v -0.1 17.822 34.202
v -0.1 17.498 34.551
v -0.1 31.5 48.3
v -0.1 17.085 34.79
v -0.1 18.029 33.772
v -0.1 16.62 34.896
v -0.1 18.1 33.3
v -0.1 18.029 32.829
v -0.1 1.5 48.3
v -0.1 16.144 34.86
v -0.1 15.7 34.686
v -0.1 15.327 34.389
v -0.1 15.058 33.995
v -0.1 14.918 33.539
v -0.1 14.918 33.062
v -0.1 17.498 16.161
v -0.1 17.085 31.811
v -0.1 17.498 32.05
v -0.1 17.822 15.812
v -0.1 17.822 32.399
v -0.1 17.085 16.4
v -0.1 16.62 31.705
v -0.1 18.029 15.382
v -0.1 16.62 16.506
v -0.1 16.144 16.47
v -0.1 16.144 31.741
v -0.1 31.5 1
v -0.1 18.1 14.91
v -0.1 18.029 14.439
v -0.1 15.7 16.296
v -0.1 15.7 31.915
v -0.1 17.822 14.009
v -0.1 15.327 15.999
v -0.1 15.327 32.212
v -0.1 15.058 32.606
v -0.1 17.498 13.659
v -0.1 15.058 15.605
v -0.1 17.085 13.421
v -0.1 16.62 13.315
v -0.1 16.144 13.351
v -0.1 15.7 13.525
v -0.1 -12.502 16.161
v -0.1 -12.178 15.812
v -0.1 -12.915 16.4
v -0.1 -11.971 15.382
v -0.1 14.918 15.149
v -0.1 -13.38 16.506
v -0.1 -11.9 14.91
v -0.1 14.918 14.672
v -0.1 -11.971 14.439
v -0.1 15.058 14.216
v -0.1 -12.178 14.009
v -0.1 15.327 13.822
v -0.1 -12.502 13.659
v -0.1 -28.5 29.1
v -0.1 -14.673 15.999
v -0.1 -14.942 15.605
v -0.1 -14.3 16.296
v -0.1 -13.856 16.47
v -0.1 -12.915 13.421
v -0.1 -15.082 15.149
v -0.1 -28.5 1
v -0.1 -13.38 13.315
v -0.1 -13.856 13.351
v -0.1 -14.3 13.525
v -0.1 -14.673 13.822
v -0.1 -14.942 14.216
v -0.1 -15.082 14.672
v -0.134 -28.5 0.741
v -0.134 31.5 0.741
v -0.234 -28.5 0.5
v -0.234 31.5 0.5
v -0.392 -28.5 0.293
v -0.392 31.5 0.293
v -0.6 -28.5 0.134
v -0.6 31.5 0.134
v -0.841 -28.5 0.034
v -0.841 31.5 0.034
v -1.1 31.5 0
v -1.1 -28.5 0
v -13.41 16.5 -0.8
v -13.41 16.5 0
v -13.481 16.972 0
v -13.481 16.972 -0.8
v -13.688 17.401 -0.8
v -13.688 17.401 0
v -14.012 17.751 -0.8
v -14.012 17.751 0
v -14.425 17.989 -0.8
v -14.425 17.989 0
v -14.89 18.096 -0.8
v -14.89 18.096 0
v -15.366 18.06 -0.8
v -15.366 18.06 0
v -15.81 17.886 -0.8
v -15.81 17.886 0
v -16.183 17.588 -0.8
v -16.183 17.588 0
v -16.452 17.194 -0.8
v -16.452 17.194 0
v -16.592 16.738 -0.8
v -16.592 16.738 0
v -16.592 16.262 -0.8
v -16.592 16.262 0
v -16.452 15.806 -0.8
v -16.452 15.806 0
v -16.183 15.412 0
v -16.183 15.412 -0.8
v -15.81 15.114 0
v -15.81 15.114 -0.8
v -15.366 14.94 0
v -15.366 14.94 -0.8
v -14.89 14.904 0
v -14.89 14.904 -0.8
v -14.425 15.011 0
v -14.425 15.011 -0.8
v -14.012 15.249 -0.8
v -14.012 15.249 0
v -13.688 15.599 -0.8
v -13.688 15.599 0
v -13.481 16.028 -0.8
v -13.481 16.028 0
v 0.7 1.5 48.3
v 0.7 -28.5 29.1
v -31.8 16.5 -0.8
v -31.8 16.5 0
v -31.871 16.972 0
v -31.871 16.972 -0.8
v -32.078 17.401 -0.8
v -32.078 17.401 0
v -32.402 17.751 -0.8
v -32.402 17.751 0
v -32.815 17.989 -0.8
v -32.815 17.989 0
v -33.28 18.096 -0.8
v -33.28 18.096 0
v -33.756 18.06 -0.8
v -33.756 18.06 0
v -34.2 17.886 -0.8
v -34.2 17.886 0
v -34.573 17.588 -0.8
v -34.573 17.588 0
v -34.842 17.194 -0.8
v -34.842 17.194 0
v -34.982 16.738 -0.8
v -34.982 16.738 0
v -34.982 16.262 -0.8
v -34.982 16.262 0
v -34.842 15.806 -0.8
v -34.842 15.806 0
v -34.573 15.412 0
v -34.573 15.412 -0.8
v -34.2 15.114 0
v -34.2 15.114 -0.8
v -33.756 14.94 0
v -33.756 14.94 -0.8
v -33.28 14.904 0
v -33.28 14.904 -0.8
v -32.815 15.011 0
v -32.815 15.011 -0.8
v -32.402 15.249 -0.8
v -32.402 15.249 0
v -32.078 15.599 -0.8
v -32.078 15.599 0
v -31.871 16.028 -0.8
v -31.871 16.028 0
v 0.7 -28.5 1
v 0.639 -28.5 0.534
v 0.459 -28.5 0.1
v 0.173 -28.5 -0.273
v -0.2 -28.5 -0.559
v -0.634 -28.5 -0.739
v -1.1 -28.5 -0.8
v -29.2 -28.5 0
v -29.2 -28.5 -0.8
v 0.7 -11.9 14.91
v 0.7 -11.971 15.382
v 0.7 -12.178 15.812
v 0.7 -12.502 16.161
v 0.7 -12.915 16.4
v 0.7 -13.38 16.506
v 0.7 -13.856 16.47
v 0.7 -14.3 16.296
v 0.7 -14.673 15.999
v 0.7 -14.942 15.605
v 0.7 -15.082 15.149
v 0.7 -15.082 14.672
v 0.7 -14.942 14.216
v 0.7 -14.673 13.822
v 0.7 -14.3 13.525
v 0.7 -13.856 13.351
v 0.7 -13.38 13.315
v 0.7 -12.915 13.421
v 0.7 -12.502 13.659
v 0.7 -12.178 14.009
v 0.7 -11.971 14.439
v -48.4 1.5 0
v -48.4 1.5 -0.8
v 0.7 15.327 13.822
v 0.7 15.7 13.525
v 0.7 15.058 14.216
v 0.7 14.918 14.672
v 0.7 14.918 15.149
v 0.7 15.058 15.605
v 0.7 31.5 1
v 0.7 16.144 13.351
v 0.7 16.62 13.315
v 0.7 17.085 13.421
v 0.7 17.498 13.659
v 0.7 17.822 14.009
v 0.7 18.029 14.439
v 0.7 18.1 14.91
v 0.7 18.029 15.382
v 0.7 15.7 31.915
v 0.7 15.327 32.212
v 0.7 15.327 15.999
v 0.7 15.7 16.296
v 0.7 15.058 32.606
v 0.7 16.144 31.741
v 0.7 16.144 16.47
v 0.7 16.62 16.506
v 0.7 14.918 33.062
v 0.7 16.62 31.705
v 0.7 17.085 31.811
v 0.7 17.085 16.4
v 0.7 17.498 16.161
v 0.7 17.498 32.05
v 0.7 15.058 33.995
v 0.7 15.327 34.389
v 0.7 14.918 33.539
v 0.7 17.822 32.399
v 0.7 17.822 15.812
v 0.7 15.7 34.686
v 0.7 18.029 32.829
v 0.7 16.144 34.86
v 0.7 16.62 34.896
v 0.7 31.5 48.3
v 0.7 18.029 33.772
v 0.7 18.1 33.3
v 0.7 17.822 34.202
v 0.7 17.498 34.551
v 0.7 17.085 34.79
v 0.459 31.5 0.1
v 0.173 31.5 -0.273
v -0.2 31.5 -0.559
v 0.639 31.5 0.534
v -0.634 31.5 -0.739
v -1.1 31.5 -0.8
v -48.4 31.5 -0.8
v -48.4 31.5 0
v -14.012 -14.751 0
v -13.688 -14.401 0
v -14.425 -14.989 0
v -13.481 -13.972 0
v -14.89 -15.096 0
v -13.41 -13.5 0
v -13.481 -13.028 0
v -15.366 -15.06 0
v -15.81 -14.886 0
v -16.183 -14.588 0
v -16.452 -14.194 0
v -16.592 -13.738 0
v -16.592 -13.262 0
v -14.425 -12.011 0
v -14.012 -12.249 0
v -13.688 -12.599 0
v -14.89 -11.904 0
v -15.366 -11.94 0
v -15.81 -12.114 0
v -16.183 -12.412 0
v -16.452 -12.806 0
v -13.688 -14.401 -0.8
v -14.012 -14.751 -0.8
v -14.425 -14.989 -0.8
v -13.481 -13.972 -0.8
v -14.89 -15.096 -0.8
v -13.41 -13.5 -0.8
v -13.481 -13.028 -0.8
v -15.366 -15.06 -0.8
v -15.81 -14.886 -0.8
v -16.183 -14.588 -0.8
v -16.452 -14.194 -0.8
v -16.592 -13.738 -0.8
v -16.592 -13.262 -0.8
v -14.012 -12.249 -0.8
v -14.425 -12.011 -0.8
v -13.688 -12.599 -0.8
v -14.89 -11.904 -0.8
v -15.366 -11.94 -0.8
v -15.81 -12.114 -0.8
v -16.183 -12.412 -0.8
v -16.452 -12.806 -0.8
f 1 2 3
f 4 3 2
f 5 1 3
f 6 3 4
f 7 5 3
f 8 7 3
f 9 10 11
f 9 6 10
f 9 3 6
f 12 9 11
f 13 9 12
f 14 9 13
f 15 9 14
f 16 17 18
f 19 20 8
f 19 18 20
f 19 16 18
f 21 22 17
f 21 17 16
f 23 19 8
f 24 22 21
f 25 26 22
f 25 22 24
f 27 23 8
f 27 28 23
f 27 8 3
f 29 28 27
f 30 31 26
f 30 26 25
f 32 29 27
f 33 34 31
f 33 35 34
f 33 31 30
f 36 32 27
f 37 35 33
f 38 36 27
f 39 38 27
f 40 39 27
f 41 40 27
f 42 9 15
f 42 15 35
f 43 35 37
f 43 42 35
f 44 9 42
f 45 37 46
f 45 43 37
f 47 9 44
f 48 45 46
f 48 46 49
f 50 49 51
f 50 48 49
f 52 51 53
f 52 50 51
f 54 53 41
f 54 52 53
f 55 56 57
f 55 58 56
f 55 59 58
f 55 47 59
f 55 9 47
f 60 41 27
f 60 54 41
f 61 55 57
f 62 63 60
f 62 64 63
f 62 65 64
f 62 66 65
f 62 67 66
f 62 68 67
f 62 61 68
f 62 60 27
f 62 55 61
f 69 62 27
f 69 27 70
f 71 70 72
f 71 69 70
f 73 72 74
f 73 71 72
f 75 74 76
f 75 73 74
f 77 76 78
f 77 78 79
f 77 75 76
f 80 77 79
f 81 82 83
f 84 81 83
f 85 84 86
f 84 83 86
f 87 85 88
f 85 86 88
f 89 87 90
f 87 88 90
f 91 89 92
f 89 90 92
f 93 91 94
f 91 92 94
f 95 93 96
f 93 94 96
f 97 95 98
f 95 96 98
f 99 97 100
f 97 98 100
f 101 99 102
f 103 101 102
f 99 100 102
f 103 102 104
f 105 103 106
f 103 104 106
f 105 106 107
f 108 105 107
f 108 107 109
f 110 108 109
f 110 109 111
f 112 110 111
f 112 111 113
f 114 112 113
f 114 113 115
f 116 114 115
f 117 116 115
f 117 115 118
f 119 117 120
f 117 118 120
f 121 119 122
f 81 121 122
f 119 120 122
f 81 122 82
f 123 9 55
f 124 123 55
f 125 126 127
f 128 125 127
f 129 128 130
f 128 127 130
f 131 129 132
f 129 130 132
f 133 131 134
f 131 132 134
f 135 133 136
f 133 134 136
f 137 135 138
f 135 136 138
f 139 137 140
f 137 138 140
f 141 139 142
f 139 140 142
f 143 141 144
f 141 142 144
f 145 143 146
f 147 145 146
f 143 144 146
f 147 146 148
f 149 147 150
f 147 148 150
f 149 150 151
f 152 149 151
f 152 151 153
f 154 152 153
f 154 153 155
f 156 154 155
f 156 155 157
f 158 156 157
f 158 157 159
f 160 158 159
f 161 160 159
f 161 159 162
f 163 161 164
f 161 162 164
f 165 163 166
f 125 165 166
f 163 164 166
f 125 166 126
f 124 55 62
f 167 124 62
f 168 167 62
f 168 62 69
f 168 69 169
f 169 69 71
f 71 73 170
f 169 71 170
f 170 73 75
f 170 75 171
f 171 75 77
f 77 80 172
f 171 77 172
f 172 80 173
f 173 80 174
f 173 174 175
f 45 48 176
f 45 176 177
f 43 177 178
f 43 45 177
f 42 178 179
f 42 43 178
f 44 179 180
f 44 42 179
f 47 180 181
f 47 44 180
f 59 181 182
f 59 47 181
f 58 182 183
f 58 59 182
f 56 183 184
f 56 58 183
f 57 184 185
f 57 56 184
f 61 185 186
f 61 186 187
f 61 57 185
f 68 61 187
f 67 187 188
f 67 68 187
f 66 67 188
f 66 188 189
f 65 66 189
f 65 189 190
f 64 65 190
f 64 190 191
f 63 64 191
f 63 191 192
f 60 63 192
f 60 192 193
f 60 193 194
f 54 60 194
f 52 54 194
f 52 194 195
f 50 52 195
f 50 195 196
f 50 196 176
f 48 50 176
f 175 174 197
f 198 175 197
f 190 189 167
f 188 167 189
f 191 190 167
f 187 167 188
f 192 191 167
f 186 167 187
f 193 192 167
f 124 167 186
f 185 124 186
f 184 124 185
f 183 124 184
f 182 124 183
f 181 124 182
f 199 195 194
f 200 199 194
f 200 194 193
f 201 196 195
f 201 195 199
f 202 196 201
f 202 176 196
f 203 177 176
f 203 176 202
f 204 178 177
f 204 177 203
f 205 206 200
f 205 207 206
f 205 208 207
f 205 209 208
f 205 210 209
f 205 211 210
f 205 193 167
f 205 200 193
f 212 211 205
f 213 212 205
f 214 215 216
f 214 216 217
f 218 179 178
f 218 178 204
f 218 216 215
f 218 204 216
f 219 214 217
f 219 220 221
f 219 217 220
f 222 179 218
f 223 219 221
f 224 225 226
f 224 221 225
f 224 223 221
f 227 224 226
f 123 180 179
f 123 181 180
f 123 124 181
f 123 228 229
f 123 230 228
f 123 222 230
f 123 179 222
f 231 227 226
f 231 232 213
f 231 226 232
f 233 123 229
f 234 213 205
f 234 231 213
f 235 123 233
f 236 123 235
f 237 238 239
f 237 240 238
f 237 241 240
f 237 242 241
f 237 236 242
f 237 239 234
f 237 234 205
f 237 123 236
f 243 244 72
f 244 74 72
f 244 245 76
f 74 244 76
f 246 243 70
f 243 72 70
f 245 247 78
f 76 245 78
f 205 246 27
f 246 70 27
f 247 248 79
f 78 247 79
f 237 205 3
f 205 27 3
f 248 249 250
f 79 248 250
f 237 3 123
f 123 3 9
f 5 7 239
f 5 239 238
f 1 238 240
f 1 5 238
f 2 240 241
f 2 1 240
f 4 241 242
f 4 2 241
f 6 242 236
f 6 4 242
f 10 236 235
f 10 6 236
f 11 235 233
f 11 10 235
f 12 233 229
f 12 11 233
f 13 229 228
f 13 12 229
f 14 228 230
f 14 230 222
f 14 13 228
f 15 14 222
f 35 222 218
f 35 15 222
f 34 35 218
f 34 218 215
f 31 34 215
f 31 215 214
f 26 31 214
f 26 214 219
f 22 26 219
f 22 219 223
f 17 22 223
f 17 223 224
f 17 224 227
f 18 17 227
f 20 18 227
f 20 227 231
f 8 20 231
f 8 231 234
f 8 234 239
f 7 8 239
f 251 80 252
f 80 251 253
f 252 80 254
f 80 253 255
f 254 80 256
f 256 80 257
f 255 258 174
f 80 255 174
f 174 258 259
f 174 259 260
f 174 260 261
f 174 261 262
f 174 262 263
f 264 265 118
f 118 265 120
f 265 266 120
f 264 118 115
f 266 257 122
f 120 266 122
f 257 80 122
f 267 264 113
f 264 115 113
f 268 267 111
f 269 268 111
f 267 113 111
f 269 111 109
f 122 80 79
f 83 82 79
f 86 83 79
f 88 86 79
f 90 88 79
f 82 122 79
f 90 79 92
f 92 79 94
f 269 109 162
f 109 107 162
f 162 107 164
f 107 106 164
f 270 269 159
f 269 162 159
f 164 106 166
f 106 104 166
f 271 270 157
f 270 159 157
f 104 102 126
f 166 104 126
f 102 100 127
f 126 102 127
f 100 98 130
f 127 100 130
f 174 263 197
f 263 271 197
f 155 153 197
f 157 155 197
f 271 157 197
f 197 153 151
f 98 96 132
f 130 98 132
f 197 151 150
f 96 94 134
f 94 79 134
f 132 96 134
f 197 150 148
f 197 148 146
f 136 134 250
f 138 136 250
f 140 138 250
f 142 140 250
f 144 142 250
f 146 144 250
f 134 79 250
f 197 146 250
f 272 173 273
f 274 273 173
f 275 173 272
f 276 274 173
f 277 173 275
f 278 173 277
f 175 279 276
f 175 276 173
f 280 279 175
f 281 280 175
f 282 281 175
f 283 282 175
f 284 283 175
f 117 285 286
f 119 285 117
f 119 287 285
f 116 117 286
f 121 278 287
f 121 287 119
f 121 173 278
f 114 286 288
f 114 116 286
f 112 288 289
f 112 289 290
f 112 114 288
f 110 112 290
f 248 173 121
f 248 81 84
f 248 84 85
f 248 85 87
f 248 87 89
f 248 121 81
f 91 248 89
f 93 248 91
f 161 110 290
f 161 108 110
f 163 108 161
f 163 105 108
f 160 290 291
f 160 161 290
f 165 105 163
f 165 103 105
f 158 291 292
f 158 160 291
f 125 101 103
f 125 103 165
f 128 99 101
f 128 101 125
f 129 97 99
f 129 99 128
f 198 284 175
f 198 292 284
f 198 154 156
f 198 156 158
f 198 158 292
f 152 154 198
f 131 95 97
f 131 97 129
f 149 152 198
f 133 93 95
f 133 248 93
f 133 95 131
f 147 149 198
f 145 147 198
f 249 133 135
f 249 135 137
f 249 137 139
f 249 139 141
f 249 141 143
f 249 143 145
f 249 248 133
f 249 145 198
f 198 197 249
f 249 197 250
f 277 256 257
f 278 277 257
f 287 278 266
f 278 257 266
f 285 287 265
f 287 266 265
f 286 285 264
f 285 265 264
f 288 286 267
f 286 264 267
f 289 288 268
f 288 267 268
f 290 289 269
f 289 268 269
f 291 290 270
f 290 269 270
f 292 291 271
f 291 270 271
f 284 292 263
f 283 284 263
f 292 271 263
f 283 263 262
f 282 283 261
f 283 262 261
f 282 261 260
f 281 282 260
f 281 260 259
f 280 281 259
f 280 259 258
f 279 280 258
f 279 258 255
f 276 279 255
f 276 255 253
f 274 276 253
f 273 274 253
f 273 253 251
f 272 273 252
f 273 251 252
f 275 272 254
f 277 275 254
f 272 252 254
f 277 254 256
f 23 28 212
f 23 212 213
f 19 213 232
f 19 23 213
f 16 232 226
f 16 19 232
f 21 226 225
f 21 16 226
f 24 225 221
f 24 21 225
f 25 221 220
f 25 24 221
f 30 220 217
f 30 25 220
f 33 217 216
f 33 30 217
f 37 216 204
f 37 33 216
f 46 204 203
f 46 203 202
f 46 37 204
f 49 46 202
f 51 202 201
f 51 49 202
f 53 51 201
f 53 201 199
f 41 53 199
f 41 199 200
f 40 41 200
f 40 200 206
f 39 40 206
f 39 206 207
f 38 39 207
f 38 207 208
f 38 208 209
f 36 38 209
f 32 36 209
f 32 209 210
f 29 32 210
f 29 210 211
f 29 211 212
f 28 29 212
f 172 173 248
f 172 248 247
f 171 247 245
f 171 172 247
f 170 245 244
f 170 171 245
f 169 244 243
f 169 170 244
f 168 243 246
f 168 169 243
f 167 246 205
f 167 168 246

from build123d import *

# Parameters (mm, degrees)
SKETCH3_R                  = 1.6
BASE_FLANGE1_DEPTH         = 0.8
SKETCHED_START             = 0.510326571
SKETCHED_BEND1_OUTLINE_W   = 60
SKETCHED_BEND1_OUTLINE_H   = 0.8
SKETCHED_BEND1_DEPTH       = 47.889673429
SKETCHED_START_2           = -1.099557429
SKETCHED_BEND1_2_OUTLINE_R = 1.6
SKETCHED_BEND1_2_DEPTH     = 1.8
SKETCHED_START_3           = -28.5
SKETCHED_BEND1_3_DEPTH     = 60


with BuildPart() as part:
    # Base-Flange1: sheet metal written as solids
    # Sketch3 → Base-Flange1 (new body)
    with BuildSketch(Plane.XY):
        Polygon((29.2, -28.5), (-29.2, -28.5), (-48.4, 1.5), (-48.4, 31.5), (48.4, 31.5), (48.4, 1.5), align=None)
        with Locations((-33.4, 16.5)):
            Circle(SKETCH3_R, mode=Mode.SUBTRACT)
        with Locations((-15.009973435, 16.5)):
            Circle(SKETCH3_R, mode=Mode.SUBTRACT)
        with Locations((-15.009973435, -13.5)):
            Circle(SKETCH3_R, mode=Mode.SUBTRACT)
        with Locations(Location((15.009973435, -13.5, 0), (0, 0, 180))):
            Circle(SKETCH3_R, mode=Mode.SUBTRACT)
        with Locations(Location((15.009973435, 16.5, 0), (0, 0, 180))):
            Circle(SKETCH3_R, mode=Mode.SUBTRACT)
        with Locations(Location((33.4, 16.5, 0), (0, 0, 180))):
            Circle(SKETCH3_R, mode=Mode.SUBTRACT)
    extrude(amount=-BASE_FLANGE1_DEPTH)

    # Sketched Bend1: read off the stored shape, not the designer's step
    # Sketched Bend1 outline → Sketched Bend1 (cut)
    with BuildSketch(Plane.YZ.offset(SKETCHED_START)):
        with Locations((1.5, -0.4)):
            Rectangle(SKETCHED_BEND1_OUTLINE_W, SKETCHED_BEND1_OUTLINE_H)
    extrude(amount=SKETCHED_BEND1_DEPTH, mode=Mode.SUBTRACT)

    # Sketched Bend1 2 outline → Sketched Bend1 2 (add)
    with BuildSketch(Plane.YZ.offset(SKETCHED_START_2)):
        Polygon((31.5, 0), (31.5, 48.300442571), (1.5, 48.300442571), (-28.5, 29.100442571), (-28.5, 0), align=None)
        with Locations((-13.5, 14.910416006)):
            Circle(SKETCHED_BEND1_2_OUTLINE_R, mode=Mode.SUBTRACT)
        with Locations((16.5, 14.910416006)):
            Circle(SKETCHED_BEND1_2_OUTLINE_R, mode=Mode.SUBTRACT)
        with Locations((16.5, 33.300442571)):
            Circle(SKETCHED_BEND1_2_OUTLINE_R, mode=Mode.SUBTRACT)
    extrude(amount=SKETCHED_BEND1_2_DEPTH)

    # Sketched Bend1 3 outline → Sketched Bend1 3 (cut)
    with BuildSketch(Plane(origin=(0, 0, 0), x_dir=(1, 0, 0), z_dir=(0, 1, 0)).offset(SKETCHED_START_3)):
        with BuildLine():
            Line((-1.099557429, -48.300442571), (-0.099557429, -48.300442571))
            Line((-0.099557429, -48.300442571), (-0.099557429, -1))
            ThreePointArc((-0.099557429, -1), (-0.392450648, -0.292893219), (-1.099557429, 0))
            Line((-1.099557429, 0), (-1.099557429, -48.300442571))
        make_face()
        with BuildLine():
            ThreePointArc((-1.099557429, 0.8), (0.173234777, 0.272792206), (0.700442571, -1))
            Line((0.700442571, -1), (0.700442571, 0))
            Line((0.700442571, 0), (0.510326571, 0))
            Line((0.510326571, 0), (0.510326571, 0.8))
            Line((0.510326571, 0.8), (-1.099557429, 0.8))
        make_face()
    extrude(amount=SKETCHED_BEND1_3_DEPTH, mode=Mode.SUBTRACT)


solid = part.part
